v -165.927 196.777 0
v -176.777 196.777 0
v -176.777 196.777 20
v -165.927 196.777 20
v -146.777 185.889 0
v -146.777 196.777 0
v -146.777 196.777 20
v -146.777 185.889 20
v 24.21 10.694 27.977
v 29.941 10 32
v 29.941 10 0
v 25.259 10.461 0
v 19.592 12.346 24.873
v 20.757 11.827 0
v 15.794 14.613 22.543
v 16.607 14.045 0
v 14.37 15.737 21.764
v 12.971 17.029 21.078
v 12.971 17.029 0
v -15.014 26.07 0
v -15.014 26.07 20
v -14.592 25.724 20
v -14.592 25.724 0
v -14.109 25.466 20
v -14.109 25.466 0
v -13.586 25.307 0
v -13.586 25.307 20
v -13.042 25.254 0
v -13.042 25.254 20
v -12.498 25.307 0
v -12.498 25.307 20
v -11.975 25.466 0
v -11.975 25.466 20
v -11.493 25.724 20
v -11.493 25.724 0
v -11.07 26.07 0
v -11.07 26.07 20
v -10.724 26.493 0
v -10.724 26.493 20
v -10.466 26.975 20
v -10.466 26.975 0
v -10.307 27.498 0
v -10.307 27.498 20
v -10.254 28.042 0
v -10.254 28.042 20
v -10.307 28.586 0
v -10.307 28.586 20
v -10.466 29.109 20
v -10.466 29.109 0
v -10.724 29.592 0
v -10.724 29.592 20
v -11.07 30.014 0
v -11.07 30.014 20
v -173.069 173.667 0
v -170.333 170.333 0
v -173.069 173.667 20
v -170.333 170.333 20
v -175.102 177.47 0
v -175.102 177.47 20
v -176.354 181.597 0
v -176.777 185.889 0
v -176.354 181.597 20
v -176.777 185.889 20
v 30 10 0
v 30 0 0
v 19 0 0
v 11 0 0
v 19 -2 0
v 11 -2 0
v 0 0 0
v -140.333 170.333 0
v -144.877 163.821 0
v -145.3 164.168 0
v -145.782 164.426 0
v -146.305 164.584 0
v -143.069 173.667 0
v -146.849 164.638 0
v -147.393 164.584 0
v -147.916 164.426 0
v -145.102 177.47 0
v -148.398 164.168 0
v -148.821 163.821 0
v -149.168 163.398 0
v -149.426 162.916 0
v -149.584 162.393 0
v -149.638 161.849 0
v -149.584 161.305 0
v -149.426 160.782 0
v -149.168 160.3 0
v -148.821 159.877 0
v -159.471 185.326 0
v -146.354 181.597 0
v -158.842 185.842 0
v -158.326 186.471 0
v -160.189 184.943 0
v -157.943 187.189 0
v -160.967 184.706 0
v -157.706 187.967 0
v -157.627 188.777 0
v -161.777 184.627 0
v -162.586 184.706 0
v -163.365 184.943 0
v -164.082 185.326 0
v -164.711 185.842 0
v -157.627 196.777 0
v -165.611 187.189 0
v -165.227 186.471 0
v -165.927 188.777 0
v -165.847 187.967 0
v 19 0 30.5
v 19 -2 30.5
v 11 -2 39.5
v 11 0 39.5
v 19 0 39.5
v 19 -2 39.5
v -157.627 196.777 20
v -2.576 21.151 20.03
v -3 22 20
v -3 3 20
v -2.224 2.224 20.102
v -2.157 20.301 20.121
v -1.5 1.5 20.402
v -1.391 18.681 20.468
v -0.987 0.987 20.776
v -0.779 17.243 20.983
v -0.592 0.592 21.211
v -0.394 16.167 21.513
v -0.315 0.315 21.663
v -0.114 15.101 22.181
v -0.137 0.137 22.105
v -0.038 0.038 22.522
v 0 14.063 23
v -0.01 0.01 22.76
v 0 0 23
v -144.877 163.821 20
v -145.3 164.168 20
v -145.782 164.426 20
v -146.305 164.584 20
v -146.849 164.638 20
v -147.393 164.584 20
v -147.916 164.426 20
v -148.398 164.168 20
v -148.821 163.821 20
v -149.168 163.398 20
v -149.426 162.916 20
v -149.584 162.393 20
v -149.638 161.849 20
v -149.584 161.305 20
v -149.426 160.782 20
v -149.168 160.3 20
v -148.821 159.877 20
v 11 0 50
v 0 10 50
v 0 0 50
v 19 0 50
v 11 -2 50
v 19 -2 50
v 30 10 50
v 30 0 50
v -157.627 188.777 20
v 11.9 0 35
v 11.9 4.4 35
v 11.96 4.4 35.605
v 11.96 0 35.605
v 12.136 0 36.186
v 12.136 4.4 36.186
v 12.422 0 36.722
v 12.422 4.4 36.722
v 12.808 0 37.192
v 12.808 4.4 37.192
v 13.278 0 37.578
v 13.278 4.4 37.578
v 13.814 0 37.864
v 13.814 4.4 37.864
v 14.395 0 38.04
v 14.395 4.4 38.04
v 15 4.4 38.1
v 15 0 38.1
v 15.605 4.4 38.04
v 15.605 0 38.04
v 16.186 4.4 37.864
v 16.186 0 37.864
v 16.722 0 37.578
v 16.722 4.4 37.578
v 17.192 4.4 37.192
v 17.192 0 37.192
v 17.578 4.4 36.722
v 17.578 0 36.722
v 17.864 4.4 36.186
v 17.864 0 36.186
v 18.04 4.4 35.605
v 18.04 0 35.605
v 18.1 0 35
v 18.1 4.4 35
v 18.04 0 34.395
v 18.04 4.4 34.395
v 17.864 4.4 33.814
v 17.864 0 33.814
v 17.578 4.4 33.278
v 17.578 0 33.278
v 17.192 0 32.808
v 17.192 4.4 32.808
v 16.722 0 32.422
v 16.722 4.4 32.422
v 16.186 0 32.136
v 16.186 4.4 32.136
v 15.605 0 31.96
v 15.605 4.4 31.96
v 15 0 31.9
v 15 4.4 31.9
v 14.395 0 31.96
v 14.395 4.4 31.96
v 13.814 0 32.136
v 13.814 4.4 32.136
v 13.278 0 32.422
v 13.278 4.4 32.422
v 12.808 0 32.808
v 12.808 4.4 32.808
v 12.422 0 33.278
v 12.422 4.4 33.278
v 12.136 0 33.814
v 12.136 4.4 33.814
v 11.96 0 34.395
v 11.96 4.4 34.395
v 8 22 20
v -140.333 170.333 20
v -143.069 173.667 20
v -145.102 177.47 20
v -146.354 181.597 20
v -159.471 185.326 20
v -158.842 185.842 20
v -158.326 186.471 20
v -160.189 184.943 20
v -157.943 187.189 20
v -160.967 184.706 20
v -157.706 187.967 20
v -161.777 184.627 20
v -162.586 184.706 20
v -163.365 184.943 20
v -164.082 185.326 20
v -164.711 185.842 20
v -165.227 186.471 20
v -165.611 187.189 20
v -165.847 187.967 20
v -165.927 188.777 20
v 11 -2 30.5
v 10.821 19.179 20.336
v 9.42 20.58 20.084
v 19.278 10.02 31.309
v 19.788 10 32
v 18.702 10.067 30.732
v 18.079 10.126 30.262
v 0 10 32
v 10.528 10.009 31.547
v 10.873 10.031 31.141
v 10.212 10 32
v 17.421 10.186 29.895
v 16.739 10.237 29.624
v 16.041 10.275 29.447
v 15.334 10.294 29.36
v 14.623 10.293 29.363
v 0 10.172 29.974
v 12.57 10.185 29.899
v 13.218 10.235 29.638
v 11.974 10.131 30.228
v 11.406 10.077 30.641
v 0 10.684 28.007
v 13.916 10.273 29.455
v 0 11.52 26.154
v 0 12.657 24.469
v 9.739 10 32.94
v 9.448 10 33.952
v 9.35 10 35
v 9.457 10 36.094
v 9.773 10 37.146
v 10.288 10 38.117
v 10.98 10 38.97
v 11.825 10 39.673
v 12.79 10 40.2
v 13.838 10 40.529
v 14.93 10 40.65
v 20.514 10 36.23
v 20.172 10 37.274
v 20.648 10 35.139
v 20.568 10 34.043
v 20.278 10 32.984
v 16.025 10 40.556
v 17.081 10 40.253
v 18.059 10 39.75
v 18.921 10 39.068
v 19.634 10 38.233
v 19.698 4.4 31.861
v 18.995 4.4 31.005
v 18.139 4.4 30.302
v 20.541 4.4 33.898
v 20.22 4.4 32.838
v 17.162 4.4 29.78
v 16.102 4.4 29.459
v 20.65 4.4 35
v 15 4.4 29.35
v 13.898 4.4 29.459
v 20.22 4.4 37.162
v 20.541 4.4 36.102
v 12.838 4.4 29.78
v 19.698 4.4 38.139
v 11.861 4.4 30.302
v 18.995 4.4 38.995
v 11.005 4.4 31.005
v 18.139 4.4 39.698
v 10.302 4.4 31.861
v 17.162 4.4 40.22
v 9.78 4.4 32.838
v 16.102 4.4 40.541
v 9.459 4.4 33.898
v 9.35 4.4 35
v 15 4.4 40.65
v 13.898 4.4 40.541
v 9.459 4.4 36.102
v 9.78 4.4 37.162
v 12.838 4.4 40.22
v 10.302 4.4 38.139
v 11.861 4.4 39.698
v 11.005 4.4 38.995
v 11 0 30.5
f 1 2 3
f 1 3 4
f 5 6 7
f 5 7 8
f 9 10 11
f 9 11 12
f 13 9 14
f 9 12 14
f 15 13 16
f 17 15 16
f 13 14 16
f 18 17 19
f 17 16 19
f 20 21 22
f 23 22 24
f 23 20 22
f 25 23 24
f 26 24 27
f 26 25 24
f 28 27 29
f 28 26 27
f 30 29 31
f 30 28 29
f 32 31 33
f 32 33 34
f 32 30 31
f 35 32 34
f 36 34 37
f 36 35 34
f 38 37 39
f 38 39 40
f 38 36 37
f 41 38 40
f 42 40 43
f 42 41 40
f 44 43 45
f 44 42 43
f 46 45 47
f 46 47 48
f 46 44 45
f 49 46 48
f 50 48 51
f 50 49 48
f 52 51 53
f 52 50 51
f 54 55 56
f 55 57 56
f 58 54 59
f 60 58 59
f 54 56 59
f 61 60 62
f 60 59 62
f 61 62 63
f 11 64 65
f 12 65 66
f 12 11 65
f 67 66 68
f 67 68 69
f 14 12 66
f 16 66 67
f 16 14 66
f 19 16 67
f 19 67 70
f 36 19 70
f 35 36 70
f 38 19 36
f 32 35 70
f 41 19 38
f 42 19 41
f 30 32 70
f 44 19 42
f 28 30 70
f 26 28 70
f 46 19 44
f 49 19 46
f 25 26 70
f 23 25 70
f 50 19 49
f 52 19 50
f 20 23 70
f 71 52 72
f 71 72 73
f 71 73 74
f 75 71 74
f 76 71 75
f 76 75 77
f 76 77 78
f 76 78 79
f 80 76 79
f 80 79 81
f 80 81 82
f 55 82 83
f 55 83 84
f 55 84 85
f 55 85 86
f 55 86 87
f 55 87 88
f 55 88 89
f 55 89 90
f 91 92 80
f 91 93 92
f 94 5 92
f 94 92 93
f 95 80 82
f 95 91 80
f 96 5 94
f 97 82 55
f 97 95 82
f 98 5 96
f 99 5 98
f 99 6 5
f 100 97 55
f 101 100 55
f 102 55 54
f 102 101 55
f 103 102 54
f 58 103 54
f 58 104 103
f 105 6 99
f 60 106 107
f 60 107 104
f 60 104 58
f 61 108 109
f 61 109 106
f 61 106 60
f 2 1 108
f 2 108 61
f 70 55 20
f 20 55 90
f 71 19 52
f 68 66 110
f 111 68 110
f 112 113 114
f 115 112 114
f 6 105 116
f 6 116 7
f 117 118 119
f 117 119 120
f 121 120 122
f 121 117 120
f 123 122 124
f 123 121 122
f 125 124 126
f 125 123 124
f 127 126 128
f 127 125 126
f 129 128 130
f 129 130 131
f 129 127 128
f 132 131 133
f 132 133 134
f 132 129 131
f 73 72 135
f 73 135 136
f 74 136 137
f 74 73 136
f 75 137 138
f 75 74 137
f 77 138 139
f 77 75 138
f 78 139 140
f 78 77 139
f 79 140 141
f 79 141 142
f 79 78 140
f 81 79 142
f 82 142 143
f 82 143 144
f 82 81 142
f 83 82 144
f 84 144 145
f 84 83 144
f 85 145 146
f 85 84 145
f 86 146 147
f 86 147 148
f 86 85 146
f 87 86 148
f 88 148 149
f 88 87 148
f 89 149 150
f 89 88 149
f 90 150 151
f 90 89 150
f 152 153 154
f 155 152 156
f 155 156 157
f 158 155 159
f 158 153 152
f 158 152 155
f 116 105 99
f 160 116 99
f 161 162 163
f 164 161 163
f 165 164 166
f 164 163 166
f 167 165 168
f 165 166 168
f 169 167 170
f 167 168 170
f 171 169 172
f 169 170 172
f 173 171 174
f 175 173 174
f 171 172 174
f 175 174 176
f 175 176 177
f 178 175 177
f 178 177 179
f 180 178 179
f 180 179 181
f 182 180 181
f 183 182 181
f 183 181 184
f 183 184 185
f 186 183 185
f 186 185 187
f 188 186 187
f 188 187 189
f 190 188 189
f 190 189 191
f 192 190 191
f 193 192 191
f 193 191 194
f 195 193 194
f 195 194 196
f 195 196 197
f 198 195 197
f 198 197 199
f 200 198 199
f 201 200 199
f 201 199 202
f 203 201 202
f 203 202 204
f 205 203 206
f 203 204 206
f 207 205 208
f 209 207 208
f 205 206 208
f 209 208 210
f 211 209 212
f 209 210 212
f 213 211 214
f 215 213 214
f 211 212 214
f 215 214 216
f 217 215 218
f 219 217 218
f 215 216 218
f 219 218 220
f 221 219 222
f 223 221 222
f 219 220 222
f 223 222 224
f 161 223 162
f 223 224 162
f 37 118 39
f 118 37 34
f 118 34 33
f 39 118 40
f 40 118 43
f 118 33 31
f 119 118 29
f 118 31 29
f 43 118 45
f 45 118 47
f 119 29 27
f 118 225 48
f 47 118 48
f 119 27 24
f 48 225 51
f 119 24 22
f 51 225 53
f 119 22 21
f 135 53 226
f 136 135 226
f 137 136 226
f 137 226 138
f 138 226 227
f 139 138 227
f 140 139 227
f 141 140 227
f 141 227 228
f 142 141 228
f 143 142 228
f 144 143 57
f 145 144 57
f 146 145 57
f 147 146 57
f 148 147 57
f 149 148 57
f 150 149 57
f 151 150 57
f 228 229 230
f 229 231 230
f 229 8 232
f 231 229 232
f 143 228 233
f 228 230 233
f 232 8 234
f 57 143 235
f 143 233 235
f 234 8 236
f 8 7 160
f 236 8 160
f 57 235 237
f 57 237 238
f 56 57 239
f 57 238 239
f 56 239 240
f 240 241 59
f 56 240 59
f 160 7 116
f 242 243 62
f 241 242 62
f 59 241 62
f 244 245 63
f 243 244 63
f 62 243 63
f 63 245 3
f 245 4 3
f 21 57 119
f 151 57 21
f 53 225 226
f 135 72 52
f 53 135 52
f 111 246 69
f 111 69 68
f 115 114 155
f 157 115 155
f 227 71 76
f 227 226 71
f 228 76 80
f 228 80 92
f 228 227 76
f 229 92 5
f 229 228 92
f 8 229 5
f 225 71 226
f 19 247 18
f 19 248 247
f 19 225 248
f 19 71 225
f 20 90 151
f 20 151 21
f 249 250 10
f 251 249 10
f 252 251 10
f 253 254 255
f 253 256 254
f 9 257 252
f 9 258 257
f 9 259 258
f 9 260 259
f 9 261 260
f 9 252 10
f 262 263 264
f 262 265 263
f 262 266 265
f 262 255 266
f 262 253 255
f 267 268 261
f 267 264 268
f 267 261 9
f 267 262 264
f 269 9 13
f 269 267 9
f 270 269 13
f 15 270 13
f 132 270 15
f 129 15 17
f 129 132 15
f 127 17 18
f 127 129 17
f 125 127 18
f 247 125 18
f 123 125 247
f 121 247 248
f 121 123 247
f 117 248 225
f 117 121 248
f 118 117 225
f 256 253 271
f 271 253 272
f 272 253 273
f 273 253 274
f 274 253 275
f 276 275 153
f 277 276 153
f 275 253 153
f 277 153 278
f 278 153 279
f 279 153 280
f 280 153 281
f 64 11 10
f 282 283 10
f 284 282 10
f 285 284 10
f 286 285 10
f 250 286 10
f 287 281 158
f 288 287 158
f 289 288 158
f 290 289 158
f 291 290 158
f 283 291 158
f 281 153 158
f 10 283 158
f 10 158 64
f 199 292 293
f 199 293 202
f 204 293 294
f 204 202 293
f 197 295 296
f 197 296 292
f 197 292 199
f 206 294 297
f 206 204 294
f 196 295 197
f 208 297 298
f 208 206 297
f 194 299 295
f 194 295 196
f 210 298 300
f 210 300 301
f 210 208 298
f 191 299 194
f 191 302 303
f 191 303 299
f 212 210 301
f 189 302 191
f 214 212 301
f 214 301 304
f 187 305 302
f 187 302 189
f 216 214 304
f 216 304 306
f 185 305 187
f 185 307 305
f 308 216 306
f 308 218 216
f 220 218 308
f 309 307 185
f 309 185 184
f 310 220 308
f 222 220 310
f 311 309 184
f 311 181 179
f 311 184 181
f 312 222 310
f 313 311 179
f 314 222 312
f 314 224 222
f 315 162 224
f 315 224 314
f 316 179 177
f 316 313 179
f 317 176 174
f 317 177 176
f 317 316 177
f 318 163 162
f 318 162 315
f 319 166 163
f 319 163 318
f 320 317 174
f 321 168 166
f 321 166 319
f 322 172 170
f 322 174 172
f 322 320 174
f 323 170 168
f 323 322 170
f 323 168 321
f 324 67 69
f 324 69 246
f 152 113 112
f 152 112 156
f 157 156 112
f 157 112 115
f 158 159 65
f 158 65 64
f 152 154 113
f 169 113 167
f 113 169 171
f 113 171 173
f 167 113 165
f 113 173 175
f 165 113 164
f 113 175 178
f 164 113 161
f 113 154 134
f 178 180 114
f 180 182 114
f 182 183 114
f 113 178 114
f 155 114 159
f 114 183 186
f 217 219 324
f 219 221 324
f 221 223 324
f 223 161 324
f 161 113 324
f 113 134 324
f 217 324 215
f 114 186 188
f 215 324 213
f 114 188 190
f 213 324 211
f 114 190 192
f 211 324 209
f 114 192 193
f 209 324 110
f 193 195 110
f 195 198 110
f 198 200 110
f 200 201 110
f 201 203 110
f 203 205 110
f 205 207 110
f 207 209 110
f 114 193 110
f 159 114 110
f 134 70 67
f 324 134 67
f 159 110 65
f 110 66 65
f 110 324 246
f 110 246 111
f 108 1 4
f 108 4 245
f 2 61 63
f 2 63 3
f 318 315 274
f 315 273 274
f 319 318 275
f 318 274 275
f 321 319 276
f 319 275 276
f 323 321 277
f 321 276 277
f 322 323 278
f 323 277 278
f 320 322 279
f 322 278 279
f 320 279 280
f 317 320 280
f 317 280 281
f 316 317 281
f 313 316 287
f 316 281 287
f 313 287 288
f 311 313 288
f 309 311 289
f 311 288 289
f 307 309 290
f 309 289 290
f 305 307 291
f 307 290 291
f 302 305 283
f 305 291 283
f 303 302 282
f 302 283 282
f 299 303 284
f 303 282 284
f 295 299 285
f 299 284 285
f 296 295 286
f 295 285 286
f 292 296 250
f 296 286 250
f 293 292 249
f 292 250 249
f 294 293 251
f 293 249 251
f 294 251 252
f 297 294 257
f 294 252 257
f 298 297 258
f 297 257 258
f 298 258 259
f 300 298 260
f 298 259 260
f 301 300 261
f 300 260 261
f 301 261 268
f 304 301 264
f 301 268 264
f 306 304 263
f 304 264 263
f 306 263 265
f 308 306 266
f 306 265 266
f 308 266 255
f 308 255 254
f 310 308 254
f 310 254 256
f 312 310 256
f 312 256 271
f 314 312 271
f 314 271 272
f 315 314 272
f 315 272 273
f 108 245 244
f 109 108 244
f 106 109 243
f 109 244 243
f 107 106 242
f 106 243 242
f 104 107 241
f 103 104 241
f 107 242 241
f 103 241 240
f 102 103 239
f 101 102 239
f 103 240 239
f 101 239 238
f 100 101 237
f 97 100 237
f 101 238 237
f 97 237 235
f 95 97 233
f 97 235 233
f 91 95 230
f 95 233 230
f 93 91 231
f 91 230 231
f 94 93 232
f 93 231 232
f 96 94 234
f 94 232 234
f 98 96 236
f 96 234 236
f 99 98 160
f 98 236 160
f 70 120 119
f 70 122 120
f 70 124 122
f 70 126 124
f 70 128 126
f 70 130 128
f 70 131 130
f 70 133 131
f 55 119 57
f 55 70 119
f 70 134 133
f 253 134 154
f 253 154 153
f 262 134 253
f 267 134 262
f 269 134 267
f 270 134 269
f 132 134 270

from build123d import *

# Parameters (mm, degrees)
PAD_DEPTH            = 20
SKETCH001_W          = 30
SKETCH001_H          = 10
PAD001_DEPTH         = 30
PAD001_DEPTH_BACK    = 20
FILLET_R             = 3
FILLET001_R          = 24
FILLET002_R          = 12
SKETCH002_R          = 3.1
POCKET_DEPTH         = 10.001
SKETCH003_R          = 5.65
POCKET001_DEPTH      = 5.6
POCKET001_DEPTH_BACK = 5
POCKET002_DEPTH      = 20.001
FILLET003_R          = 22
FILLET004_R          = 22
SKETCH005_W          = 8
SKETCH005_H          = 10.5
SKETCH005_H_2        = 30.5
PAD002_DEPTH         = 2


with BuildPart() as part:
    # Sketch → Pad (new body)
    with BuildSketch(Plane.XY):
        Polygon((-146.776695, 176.776695), (30, 0), (0, 0), (-176.776695, 176.776695), (-176.776695, 196.776695), (-146.776695, 196.776695), align=None)
        with BuildLine():
            ThreePointArc((-144.877384, 163.821067), (-148.821067, 163.821067), (-148.821067, 159.877384))
            Line((-148.821067, 159.877384), (-15.014124, 26.070441))
            ThreePointArc((-15.014124, 26.070441), (-11.070441, 26.070441), (-11.070441, 30.014124))
            Line((-144.877384, 163.821067), (-11.070441, 30.014124))
        make_face(mode=Mode.SUBTRACT)
    extrude(amount=PAD_DEPTH)

    # Sketch001 (on Face12 of Pad) → Pad001 (join, two sides)
    with BuildSketch(Plane.XY.offset(20)) as pad001_sk:
        with Locations((15, 5)):
            Rectangle(SKETCH001_W, SKETCH001_H)
    extrude(amount=PAD001_DEPTH)
    extrude(pad001_sk.sketch, amount=-PAD001_DEPTH_BACK)

    # Fillet
    fillet_edges = [part.edges().sort_by_distance(p)[0] for p in [
        (0, 5, 20),
    ]]
    fillet(fillet_edges, radius=FILLET_R)

    # Fillet001
    fillet001_edges = [part.edges().sort_by_distance(p)[0] for p in [
        (20, 10, 10),
    ]]
    fillet(fillet001_edges, radius=FILLET001_R)

    # Fillet002
    fillet002_edges = [part.edges().sort_by_distance(p)[0] for p in [
        (8.5, 10, 20),
    ]]
    fillet(fillet002_edges, radius=FILLET002_R)

    # Sketch002 (on Face1 of Fillet002) → Pocket (cut, through all)
    with BuildSketch(Plane(origin=(0, 10, 0), x_dir=(-1, 0, 0), z_dir=(0, 1, 0))):
        with Locations((-15, 35)):
            Circle(SKETCH002_R)
    extrude(amount=-POCKET_DEPTH, mode=Mode.SUBTRACT)

    # Sketch003 (on Face1 of Pocket) → Pocket001 (cut, two sides)
    with BuildSketch(Plane(origin=(0, 10, 0), x_dir=(-1, 0, 0), z_dir=(0, 1, 0))) as pocket001_sk:
        with Locations((-15, 35)):
            Circle(SKETCH003_R)
    extrude(amount=-POCKET001_DEPTH, mode=Mode.SUBTRACT)
    extrude(pocket001_sk.sketch, amount=POCKET001_DEPTH_BACK, mode=Mode.SUBTRACT)

    # Sketch004 (on Face21 of Pocket001) → Pocket002 (cut, through all)
    with BuildSketch(Plane.XY.offset(20)):
        with BuildLine():
            ThreePointArc((-157.626695, 204.776695), (-161.776695, 208.926695), (-165.926695, 204.776695))
            Line((-165.926695, 204.776695), (-165.926695, 188.776695))
            ThreePointArc((-165.926695, 188.776695), (-161.776695, 184.626695), (-157.626695, 188.776695))
            Line((-157.626695, 204.776695), (-157.626695, 188.776695))
        make_face()
    extrude(amount=-POCKET002_DEPTH, mode=Mode.SUBTRACT)

    # Fillet003
    fillet003_edges = [part.edges().sort_by_distance(p)[0] for p in [
        (-146.776695, 176.776695, 10),
    ]]
    fillet(fillet003_edges, radius=FILLET003_R)

    # Fillet004
    fillet004_edges = [part.edges().sort_by_distance(p)[0] for p in [
        (-176.776695, 176.776695, 10),
    ]]
    fillet(fillet004_edges, radius=FILLET004_R)

    # Sketch005 (on Face4 of Fillet004) → Pad002 (join)
    with BuildSketch(Plane.XZ):
        with Locations((15, 44.75)):
            Rectangle(SKETCH005_W, SKETCH005_H)
        with Locations((15, 15.25)):
            Rectangle(SKETCH005_W, SKETCH005_H_2)
    extrude(amount=PAD002_DEPTH)


solid = part.part
